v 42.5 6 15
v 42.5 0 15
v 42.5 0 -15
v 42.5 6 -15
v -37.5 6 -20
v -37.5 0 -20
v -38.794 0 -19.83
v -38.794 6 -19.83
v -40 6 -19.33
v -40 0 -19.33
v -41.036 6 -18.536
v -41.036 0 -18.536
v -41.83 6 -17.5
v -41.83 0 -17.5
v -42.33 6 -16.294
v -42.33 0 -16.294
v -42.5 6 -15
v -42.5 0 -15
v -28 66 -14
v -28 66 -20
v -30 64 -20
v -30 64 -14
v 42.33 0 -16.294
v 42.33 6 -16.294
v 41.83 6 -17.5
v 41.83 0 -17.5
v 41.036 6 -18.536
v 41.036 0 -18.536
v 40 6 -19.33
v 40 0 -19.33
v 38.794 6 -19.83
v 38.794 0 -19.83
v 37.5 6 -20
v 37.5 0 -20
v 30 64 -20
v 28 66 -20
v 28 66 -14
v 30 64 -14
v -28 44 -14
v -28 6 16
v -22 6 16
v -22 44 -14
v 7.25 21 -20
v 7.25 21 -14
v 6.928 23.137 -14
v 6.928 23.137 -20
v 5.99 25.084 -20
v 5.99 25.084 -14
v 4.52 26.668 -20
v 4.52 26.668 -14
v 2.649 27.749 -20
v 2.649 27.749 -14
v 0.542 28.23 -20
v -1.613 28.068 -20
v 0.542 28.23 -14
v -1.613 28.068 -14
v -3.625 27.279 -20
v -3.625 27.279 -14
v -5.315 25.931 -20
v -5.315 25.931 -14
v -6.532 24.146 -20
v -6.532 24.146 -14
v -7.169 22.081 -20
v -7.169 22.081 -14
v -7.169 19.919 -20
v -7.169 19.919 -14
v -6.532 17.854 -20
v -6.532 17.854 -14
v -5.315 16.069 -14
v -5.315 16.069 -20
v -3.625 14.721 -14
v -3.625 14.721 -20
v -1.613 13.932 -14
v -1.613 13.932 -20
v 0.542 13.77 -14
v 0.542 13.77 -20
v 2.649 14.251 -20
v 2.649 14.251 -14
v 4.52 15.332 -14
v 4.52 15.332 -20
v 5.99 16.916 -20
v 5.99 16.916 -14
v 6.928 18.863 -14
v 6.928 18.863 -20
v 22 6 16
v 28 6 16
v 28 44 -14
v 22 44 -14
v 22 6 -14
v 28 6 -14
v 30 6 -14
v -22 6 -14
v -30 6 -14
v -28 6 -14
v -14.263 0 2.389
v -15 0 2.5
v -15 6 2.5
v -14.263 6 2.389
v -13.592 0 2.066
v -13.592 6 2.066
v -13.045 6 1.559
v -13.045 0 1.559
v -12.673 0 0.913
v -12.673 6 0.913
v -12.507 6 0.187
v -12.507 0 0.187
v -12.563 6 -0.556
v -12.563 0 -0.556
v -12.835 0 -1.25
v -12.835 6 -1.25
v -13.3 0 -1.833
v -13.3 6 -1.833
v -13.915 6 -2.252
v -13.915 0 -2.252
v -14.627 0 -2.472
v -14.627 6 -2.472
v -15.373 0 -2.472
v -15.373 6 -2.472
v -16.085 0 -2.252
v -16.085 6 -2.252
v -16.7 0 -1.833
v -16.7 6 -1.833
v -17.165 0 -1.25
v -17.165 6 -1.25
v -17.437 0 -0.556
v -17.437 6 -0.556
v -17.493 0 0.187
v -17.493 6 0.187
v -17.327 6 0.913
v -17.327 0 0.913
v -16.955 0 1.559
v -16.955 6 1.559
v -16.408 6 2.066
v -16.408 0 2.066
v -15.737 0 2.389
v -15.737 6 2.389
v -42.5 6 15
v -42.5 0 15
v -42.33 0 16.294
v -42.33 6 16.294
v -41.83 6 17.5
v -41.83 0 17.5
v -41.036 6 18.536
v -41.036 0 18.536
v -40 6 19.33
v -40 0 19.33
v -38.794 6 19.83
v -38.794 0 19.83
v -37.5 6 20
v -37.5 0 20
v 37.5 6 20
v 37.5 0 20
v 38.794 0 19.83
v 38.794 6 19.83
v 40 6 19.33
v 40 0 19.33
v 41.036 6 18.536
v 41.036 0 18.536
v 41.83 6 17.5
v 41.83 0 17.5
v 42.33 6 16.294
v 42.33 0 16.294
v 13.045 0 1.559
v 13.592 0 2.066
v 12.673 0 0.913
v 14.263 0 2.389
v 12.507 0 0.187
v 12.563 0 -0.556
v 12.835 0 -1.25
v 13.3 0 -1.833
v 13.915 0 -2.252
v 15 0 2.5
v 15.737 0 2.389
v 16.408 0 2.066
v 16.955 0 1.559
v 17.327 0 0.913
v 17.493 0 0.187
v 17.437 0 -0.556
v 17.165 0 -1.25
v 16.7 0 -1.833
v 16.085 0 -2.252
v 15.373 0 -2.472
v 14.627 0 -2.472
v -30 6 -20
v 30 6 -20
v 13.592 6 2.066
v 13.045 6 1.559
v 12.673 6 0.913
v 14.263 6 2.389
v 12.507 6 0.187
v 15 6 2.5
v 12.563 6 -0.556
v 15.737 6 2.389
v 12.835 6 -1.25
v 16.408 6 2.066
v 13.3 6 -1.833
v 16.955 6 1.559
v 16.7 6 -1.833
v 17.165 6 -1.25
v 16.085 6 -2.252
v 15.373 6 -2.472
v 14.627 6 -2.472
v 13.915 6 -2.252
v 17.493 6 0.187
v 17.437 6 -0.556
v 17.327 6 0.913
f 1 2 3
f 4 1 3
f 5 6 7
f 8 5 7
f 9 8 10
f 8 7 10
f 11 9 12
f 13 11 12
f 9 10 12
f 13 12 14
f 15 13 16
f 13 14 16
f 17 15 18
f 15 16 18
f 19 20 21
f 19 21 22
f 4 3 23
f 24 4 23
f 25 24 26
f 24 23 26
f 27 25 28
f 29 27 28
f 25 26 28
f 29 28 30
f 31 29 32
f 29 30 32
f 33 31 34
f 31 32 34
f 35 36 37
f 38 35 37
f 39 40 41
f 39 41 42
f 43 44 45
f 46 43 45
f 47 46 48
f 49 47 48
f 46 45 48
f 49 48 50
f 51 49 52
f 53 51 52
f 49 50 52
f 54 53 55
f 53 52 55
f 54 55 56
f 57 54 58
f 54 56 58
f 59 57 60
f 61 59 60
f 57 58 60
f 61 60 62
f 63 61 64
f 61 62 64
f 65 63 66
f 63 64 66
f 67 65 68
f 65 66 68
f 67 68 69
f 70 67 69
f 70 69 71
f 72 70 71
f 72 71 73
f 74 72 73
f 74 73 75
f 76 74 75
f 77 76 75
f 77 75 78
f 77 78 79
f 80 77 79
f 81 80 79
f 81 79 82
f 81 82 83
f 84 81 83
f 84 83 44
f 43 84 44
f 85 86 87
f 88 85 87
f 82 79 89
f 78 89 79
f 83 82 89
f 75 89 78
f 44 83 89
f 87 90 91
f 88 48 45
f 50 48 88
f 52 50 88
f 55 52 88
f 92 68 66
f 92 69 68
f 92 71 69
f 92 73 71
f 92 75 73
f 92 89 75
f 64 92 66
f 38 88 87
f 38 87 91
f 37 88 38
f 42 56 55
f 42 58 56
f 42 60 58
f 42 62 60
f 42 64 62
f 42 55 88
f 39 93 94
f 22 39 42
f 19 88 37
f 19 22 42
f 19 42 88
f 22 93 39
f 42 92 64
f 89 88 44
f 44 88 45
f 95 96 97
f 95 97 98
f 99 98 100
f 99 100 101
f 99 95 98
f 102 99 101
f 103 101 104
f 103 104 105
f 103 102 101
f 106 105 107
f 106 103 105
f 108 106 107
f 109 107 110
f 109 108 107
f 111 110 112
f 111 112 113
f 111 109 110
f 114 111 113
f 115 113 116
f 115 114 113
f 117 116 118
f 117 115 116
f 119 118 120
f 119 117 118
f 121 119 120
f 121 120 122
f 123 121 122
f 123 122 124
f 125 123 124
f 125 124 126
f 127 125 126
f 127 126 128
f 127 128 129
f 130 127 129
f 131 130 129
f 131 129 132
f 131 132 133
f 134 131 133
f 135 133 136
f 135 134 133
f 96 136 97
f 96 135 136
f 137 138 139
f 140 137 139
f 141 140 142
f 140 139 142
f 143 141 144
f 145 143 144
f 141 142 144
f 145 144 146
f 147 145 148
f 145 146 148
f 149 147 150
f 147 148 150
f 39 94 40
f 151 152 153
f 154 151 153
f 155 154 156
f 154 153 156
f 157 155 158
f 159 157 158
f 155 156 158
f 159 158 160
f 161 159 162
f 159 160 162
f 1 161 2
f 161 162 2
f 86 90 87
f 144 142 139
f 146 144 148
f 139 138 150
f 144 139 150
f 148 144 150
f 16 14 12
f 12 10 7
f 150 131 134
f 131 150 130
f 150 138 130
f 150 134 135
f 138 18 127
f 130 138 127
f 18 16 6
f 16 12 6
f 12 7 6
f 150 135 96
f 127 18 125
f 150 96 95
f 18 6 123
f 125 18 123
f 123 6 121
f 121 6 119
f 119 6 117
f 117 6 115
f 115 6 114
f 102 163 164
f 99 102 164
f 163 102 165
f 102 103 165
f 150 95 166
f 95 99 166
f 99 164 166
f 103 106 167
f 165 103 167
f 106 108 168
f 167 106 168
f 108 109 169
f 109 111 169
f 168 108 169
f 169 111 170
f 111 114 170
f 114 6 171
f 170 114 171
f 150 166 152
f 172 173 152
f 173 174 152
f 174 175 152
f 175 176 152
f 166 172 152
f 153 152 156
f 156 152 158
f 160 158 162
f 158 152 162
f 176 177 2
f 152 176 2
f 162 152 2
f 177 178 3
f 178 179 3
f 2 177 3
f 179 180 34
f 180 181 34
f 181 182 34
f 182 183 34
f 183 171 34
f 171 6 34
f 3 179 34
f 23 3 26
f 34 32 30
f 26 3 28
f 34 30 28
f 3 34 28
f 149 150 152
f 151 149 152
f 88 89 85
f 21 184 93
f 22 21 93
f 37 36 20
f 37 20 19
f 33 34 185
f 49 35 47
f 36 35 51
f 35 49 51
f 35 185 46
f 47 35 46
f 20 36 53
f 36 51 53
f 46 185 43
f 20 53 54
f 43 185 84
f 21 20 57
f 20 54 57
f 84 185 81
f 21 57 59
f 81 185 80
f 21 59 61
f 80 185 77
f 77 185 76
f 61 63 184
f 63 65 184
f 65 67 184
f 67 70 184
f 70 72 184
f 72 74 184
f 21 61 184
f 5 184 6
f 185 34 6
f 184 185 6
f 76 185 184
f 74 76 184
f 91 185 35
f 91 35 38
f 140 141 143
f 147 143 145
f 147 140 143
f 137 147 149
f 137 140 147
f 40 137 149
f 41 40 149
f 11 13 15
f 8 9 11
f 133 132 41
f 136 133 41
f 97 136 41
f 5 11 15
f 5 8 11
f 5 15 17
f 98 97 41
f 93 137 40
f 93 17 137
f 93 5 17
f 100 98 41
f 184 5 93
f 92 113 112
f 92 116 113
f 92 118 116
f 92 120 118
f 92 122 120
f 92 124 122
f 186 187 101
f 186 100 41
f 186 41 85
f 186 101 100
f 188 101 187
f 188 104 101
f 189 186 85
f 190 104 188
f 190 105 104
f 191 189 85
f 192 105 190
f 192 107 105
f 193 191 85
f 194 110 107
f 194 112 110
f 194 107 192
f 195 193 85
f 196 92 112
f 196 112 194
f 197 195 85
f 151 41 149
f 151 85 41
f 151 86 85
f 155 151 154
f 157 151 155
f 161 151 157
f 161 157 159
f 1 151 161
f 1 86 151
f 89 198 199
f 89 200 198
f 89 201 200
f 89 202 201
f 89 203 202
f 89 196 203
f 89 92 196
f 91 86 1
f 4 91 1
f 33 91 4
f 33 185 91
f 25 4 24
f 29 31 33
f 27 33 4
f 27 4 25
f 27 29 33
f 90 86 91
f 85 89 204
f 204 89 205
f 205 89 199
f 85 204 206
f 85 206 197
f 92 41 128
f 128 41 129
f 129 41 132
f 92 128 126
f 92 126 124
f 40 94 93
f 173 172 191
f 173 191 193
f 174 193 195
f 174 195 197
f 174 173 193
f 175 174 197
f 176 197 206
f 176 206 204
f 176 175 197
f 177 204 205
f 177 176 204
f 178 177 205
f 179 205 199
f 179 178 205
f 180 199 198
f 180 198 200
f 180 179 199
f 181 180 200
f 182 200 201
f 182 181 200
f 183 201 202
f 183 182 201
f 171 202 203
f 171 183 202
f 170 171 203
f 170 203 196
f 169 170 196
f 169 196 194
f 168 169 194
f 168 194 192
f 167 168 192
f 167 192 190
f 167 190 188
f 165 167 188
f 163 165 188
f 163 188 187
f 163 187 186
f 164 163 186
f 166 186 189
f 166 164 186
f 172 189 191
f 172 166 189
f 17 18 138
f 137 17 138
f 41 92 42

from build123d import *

# Parameters (mm, degrees)
SKETCH1_R           = 2.5
BOSS_EXTRUDE1_DEPTH = 6
BOSS_EXTRUDE2_START = -12.5
SKETCH2_W           = 6
SKETCH2_H           = 60
BOSS_EXTRUDE2_DEPTH = 60
BOSS_EXTRUDE3_START = -2
BOSS_EXTRUDE3_DEPTH = 6
BOSS_EXTRUDE4_START = -2
BOSS_EXTRUDE4_DEPTH = 6
SKETCH6_R           = 7.25
CUT_EXTRUDE1_DEPTH  = 86.546770833
CHAMFER3_SIZE       = 2


with BuildPart() as part:
    # Sketch1 → Boss-Extrude1 (new body)
    with BuildSketch(Plane(origin=(0, 0, 0), x_dir=(1, 0, 0), z_dir=(0, 1, 0))):
        with BuildLine():
            Line((-37.5, -20), (37.5, -20))
            ThreePointArc((37.5, -20), (41.035533906, -18.535533906), (42.5, -15))
            Line((42.5, -15), (42.5, 15))
            ThreePointArc((42.5, 15), (41.035533906, 18.535533906), (37.5, 20))
            Line((37.5, 20), (-37.5, 20))
            ThreePointArc((-37.5, 20), (-41.035533906, 18.535533906), (-42.5, 15))
            Line((-42.5, 15), (-42.5, -15))
            ThreePointArc((-42.5, -15), (-41.035533906, -18.535533906), (-37.5, -20))
        make_face()
        with Locations(Location((-15, 0, 0), (0, 0, 270))):
            Circle(SKETCH1_R, mode=Mode.SUBTRACT)
        with Locations(Location((15, 0, 0), (0, 0, 270))):
            Circle(SKETCH1_R, mode=Mode.SUBTRACT)
    extrude(amount=BOSS_EXTRUDE1_DEPTH)

    # Sketch2 → Boss-Extrude2 (add)
    with BuildSketch(Plane.ZY.offset(42.5).offset(BOSS_EXTRUDE2_START)):
        with Locations((-17, 36)):
            Rectangle(SKETCH2_W, SKETCH2_H)
    extrude(amount=-BOSS_EXTRUDE2_DEPTH)

    # Sketch4 → Boss-Extrude3 (add)
    with BuildSketch(Plane.ZY.offset(30).offset(BOSS_EXTRUDE3_START)):
        Polygon((16, 6), (-14, 44), (-14, 6), align=None)
    extrude(amount=-BOSS_EXTRUDE3_DEPTH)

    # Sketch5 → Boss-Extrude4 (add)
    with BuildSketch(Plane(origin=(30, 0, 0), x_dir=(0, 0, -1), z_dir=(1, 0, 0)).offset(BOSS_EXTRUDE4_START)):
        Polygon((-16, 6), (14, 44), (14, 6), align=None)
    extrude(amount=-BOSS_EXTRUDE4_DEPTH)

    # Sketch6 → Cut-Extrude1 (cut, through all)
    with BuildSketch(Plane.XY.offset(-14)):
        with Locations((0, 21)):
            Circle(SKETCH6_R)
    extrude(amount=-CUT_EXTRUDE1_DEPTH, mode=Mode.SUBTRACT)

    # Chamfer3
    chamfer3_edges = [part.edges().sort_by_distance(p)[0] for p in [
        (30, 66, -17),
        (-30, 66, -17),
    ]]
    chamfer(chamfer3_edges, length=CHAMFER3_SIZE)


solid = part.part
